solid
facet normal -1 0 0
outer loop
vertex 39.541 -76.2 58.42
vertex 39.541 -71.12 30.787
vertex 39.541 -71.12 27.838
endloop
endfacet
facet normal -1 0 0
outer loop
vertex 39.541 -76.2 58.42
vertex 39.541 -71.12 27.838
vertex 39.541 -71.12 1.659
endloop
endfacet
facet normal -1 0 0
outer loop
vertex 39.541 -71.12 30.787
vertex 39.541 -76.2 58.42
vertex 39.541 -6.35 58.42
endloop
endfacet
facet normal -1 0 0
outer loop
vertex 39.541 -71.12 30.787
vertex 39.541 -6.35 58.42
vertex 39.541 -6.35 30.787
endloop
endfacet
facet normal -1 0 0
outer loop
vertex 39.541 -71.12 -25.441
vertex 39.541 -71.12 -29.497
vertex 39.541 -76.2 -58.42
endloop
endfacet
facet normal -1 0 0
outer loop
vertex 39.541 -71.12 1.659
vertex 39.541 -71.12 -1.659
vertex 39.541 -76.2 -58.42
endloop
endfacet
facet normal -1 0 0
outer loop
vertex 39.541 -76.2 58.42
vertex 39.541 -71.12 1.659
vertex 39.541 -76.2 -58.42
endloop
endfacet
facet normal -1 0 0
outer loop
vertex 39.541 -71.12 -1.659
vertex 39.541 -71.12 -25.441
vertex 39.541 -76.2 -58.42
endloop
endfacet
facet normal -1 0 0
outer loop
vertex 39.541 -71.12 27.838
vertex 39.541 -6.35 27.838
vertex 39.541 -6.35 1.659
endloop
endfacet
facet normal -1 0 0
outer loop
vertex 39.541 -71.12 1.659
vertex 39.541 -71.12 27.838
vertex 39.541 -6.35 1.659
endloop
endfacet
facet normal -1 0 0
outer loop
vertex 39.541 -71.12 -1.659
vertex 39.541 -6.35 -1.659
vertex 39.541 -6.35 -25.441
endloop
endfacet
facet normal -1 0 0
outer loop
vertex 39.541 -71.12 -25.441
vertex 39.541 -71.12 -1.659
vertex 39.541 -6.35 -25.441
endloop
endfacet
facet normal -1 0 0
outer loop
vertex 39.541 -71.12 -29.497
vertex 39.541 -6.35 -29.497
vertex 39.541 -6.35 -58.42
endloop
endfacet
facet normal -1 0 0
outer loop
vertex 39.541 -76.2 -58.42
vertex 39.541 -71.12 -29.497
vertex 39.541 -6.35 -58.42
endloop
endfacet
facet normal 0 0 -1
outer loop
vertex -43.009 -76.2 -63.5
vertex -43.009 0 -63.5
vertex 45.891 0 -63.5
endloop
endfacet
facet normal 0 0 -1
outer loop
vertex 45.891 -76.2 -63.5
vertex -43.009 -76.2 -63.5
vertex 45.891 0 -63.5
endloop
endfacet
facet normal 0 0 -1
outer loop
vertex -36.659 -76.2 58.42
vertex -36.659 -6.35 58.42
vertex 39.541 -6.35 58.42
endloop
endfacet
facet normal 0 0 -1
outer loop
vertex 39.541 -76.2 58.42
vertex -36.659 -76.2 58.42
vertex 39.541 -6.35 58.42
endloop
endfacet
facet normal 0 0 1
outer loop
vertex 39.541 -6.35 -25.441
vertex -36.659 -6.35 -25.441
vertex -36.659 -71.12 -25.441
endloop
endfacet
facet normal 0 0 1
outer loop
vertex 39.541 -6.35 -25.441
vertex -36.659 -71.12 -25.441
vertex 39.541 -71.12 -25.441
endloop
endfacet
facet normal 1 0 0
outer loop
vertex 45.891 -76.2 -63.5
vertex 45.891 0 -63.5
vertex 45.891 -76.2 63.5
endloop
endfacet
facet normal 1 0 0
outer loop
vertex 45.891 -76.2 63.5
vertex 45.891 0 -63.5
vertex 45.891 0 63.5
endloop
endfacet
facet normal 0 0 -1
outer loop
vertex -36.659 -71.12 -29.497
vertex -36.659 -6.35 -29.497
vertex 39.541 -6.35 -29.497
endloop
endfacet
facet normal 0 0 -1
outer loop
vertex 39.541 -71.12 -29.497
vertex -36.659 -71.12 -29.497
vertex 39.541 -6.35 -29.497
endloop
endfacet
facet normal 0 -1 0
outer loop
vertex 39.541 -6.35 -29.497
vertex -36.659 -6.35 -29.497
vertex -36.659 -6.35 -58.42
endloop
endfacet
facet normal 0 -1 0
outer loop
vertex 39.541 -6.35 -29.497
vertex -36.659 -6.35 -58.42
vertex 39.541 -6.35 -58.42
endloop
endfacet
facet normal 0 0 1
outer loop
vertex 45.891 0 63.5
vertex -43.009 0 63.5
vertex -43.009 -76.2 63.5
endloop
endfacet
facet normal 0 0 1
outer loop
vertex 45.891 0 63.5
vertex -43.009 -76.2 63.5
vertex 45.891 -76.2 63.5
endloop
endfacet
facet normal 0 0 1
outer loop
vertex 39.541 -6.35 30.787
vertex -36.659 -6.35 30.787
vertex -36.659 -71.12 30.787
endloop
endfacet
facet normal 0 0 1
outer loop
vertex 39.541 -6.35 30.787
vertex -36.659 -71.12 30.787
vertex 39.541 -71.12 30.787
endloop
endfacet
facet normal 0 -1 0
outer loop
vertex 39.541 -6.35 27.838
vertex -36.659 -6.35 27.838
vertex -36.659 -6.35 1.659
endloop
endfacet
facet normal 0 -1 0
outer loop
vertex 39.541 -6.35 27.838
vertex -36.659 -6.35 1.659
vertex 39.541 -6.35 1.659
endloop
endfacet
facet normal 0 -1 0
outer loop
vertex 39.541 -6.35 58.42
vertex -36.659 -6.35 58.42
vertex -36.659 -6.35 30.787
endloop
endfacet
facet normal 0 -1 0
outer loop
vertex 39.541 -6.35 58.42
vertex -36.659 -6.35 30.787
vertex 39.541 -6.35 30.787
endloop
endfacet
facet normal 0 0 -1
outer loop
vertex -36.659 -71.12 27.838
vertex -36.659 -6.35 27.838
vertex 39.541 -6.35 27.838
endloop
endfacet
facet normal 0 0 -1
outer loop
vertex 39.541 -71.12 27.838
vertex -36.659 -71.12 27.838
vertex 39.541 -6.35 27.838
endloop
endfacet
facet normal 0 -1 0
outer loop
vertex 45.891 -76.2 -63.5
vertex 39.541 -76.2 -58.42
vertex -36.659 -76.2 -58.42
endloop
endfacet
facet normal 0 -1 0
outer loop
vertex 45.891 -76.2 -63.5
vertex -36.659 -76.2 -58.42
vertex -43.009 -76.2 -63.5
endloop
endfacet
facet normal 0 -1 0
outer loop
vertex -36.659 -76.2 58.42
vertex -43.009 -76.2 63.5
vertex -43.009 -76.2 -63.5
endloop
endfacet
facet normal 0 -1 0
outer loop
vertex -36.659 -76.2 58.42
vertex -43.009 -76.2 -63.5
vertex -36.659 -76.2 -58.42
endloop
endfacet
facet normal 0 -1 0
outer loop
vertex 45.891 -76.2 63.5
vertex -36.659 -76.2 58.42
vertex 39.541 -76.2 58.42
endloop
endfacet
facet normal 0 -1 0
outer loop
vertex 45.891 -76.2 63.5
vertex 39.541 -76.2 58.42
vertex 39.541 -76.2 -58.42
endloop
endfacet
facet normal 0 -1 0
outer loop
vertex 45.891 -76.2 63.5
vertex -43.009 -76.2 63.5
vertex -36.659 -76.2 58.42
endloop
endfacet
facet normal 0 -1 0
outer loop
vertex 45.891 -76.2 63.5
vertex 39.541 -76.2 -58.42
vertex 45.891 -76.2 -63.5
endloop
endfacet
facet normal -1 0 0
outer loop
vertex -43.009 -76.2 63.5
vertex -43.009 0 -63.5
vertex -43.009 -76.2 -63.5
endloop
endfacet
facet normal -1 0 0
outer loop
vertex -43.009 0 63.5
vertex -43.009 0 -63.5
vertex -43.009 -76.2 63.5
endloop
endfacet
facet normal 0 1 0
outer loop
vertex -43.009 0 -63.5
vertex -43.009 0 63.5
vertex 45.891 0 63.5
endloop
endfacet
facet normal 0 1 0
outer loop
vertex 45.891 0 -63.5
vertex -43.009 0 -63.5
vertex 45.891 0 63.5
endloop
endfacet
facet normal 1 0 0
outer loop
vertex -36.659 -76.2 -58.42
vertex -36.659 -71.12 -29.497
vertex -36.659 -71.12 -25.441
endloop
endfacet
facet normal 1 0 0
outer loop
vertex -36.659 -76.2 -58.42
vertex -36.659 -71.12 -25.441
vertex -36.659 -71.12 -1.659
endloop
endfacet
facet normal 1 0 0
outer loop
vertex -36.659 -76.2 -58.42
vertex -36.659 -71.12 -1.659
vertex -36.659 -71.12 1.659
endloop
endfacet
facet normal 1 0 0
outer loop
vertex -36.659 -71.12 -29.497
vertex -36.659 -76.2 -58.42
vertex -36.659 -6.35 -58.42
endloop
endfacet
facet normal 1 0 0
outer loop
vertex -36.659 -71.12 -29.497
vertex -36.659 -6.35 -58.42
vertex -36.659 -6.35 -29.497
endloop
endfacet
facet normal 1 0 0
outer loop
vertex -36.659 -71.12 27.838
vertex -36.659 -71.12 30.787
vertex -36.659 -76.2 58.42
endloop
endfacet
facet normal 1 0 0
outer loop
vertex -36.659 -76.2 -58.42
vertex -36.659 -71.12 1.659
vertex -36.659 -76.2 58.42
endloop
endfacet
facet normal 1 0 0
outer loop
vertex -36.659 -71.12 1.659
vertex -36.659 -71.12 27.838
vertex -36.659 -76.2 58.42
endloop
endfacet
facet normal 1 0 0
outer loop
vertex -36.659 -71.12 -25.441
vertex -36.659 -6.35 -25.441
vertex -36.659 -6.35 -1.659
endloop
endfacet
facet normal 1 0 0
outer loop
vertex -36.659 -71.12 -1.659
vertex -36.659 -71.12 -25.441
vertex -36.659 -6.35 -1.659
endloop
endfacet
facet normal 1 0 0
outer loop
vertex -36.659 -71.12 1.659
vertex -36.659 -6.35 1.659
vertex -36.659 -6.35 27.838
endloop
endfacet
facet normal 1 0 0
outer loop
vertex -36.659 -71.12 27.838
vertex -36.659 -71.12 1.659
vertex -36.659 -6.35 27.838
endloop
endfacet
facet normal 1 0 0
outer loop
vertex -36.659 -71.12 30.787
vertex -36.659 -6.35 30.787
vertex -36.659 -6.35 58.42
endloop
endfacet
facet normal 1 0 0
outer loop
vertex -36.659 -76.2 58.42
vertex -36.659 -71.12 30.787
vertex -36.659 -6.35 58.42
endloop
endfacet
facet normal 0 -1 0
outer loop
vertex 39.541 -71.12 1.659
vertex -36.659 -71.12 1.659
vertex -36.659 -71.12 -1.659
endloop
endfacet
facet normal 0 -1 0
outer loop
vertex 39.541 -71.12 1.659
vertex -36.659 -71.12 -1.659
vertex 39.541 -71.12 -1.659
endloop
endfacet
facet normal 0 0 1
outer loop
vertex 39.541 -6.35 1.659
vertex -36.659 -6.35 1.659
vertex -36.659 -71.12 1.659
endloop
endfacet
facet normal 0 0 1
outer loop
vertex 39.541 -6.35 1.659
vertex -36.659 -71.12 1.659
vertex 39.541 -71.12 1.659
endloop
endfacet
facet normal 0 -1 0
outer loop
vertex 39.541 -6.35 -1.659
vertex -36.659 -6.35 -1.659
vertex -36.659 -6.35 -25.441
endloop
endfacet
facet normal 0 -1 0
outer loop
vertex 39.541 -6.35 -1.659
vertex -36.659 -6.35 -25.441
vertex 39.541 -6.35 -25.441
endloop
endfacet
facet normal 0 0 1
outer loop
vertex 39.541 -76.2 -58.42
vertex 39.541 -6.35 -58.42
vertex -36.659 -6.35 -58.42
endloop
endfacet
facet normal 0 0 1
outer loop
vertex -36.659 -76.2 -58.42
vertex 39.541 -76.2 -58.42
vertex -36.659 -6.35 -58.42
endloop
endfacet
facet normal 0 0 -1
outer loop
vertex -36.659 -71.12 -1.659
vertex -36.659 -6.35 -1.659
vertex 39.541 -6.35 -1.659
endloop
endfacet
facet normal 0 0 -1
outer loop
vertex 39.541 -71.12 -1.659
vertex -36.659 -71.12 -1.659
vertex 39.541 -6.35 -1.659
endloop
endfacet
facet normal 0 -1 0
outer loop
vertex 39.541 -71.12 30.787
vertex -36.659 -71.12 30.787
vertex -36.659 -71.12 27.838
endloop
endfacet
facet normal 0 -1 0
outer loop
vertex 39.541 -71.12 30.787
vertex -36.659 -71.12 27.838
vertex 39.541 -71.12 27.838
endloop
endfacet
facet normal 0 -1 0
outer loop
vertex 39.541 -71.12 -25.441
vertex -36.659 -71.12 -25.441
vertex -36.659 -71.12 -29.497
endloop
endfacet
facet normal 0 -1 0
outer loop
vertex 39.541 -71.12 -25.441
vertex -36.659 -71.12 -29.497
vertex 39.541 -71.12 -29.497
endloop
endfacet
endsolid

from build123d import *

# Parameters (mm, degrees)
F0_W     = 88.9
F0_H     = 127
F1_DEPTH = 76.2
F0_W_2   = 76.2
F0_H_2   = 4.0558092296
F0_H_3   = 3.3183873165
F0_H_4   = 2.9496774077
F2_DEPTH = 71.12
F0_H_5   = 27.6327425224
F0_H_6   = 26.1783864116
F0_H_7   = 23.7817749148
F0_H_8   = 28.9232221973
F3_DEPTH = 6.35


with BuildPart() as f1:
    # F0 (on Front) → F1 (new body)
    with BuildSketch(Plane.XZ):
        with Locations((1.440508941, 0)):
            Rectangle(F0_W, F0_H)
        Polygon((-36.659491059, 58.42), (39.540508941, 58.42), (39.540508941, 30.7872574776), (39.540508941, 27.8375800699), (39.540508941, 1.6591936583), (39.540508941, -1.6591936583), (39.540508941, -25.4409685731), (39.540508941, -29.4967778027), (39.540508941, -58.42), (-36.659491059, -58.42), (-36.659491059, -29.4967778027), (-36.659491059, -25.4409685731), (-36.659491059, -1.6591936583), (-36.659491059, 1.6591936583), (-36.659491059, 27.8375800699), (-36.659491059, 30.7872574776), align=None, mode=Mode.SUBTRACT)
    extrude(amount=F1_DEPTH)

    # F0 (on Front) → F2 (join)
    with BuildSketch(Plane.XZ):
        with Locations((1.440508941, -27.4688731879)):
            Rectangle(F0_W_2, F0_H_2)
        with Locations((1.440508941, 0)):
            Rectangle(F0_W_2, F0_H_3)
        with Locations((1.440508941, 29.3124187738)):
            Rectangle(F0_W_2, F0_H_4)
    extrude(amount=F2_DEPTH)

    # F0 (on Front) → F3 (join)
    with BuildSketch(Plane.XZ):
        with Locations((1.440508941, 44.6036287388)):
            Rectangle(F0_W_2, F0_H_5)
        with Locations((1.440508941, 14.7483868641)):
            Rectangle(F0_W_2, F0_H_6)
        with Locations((1.440508941, -13.5500811157)):
            Rectangle(F0_W_2, F0_H_7)
        with Locations((1.440508941, -43.9583889014)):
            Rectangle(F0_W_2, F0_H_8)
    extrude(amount=F3_DEPTH)


solid = f1.part
